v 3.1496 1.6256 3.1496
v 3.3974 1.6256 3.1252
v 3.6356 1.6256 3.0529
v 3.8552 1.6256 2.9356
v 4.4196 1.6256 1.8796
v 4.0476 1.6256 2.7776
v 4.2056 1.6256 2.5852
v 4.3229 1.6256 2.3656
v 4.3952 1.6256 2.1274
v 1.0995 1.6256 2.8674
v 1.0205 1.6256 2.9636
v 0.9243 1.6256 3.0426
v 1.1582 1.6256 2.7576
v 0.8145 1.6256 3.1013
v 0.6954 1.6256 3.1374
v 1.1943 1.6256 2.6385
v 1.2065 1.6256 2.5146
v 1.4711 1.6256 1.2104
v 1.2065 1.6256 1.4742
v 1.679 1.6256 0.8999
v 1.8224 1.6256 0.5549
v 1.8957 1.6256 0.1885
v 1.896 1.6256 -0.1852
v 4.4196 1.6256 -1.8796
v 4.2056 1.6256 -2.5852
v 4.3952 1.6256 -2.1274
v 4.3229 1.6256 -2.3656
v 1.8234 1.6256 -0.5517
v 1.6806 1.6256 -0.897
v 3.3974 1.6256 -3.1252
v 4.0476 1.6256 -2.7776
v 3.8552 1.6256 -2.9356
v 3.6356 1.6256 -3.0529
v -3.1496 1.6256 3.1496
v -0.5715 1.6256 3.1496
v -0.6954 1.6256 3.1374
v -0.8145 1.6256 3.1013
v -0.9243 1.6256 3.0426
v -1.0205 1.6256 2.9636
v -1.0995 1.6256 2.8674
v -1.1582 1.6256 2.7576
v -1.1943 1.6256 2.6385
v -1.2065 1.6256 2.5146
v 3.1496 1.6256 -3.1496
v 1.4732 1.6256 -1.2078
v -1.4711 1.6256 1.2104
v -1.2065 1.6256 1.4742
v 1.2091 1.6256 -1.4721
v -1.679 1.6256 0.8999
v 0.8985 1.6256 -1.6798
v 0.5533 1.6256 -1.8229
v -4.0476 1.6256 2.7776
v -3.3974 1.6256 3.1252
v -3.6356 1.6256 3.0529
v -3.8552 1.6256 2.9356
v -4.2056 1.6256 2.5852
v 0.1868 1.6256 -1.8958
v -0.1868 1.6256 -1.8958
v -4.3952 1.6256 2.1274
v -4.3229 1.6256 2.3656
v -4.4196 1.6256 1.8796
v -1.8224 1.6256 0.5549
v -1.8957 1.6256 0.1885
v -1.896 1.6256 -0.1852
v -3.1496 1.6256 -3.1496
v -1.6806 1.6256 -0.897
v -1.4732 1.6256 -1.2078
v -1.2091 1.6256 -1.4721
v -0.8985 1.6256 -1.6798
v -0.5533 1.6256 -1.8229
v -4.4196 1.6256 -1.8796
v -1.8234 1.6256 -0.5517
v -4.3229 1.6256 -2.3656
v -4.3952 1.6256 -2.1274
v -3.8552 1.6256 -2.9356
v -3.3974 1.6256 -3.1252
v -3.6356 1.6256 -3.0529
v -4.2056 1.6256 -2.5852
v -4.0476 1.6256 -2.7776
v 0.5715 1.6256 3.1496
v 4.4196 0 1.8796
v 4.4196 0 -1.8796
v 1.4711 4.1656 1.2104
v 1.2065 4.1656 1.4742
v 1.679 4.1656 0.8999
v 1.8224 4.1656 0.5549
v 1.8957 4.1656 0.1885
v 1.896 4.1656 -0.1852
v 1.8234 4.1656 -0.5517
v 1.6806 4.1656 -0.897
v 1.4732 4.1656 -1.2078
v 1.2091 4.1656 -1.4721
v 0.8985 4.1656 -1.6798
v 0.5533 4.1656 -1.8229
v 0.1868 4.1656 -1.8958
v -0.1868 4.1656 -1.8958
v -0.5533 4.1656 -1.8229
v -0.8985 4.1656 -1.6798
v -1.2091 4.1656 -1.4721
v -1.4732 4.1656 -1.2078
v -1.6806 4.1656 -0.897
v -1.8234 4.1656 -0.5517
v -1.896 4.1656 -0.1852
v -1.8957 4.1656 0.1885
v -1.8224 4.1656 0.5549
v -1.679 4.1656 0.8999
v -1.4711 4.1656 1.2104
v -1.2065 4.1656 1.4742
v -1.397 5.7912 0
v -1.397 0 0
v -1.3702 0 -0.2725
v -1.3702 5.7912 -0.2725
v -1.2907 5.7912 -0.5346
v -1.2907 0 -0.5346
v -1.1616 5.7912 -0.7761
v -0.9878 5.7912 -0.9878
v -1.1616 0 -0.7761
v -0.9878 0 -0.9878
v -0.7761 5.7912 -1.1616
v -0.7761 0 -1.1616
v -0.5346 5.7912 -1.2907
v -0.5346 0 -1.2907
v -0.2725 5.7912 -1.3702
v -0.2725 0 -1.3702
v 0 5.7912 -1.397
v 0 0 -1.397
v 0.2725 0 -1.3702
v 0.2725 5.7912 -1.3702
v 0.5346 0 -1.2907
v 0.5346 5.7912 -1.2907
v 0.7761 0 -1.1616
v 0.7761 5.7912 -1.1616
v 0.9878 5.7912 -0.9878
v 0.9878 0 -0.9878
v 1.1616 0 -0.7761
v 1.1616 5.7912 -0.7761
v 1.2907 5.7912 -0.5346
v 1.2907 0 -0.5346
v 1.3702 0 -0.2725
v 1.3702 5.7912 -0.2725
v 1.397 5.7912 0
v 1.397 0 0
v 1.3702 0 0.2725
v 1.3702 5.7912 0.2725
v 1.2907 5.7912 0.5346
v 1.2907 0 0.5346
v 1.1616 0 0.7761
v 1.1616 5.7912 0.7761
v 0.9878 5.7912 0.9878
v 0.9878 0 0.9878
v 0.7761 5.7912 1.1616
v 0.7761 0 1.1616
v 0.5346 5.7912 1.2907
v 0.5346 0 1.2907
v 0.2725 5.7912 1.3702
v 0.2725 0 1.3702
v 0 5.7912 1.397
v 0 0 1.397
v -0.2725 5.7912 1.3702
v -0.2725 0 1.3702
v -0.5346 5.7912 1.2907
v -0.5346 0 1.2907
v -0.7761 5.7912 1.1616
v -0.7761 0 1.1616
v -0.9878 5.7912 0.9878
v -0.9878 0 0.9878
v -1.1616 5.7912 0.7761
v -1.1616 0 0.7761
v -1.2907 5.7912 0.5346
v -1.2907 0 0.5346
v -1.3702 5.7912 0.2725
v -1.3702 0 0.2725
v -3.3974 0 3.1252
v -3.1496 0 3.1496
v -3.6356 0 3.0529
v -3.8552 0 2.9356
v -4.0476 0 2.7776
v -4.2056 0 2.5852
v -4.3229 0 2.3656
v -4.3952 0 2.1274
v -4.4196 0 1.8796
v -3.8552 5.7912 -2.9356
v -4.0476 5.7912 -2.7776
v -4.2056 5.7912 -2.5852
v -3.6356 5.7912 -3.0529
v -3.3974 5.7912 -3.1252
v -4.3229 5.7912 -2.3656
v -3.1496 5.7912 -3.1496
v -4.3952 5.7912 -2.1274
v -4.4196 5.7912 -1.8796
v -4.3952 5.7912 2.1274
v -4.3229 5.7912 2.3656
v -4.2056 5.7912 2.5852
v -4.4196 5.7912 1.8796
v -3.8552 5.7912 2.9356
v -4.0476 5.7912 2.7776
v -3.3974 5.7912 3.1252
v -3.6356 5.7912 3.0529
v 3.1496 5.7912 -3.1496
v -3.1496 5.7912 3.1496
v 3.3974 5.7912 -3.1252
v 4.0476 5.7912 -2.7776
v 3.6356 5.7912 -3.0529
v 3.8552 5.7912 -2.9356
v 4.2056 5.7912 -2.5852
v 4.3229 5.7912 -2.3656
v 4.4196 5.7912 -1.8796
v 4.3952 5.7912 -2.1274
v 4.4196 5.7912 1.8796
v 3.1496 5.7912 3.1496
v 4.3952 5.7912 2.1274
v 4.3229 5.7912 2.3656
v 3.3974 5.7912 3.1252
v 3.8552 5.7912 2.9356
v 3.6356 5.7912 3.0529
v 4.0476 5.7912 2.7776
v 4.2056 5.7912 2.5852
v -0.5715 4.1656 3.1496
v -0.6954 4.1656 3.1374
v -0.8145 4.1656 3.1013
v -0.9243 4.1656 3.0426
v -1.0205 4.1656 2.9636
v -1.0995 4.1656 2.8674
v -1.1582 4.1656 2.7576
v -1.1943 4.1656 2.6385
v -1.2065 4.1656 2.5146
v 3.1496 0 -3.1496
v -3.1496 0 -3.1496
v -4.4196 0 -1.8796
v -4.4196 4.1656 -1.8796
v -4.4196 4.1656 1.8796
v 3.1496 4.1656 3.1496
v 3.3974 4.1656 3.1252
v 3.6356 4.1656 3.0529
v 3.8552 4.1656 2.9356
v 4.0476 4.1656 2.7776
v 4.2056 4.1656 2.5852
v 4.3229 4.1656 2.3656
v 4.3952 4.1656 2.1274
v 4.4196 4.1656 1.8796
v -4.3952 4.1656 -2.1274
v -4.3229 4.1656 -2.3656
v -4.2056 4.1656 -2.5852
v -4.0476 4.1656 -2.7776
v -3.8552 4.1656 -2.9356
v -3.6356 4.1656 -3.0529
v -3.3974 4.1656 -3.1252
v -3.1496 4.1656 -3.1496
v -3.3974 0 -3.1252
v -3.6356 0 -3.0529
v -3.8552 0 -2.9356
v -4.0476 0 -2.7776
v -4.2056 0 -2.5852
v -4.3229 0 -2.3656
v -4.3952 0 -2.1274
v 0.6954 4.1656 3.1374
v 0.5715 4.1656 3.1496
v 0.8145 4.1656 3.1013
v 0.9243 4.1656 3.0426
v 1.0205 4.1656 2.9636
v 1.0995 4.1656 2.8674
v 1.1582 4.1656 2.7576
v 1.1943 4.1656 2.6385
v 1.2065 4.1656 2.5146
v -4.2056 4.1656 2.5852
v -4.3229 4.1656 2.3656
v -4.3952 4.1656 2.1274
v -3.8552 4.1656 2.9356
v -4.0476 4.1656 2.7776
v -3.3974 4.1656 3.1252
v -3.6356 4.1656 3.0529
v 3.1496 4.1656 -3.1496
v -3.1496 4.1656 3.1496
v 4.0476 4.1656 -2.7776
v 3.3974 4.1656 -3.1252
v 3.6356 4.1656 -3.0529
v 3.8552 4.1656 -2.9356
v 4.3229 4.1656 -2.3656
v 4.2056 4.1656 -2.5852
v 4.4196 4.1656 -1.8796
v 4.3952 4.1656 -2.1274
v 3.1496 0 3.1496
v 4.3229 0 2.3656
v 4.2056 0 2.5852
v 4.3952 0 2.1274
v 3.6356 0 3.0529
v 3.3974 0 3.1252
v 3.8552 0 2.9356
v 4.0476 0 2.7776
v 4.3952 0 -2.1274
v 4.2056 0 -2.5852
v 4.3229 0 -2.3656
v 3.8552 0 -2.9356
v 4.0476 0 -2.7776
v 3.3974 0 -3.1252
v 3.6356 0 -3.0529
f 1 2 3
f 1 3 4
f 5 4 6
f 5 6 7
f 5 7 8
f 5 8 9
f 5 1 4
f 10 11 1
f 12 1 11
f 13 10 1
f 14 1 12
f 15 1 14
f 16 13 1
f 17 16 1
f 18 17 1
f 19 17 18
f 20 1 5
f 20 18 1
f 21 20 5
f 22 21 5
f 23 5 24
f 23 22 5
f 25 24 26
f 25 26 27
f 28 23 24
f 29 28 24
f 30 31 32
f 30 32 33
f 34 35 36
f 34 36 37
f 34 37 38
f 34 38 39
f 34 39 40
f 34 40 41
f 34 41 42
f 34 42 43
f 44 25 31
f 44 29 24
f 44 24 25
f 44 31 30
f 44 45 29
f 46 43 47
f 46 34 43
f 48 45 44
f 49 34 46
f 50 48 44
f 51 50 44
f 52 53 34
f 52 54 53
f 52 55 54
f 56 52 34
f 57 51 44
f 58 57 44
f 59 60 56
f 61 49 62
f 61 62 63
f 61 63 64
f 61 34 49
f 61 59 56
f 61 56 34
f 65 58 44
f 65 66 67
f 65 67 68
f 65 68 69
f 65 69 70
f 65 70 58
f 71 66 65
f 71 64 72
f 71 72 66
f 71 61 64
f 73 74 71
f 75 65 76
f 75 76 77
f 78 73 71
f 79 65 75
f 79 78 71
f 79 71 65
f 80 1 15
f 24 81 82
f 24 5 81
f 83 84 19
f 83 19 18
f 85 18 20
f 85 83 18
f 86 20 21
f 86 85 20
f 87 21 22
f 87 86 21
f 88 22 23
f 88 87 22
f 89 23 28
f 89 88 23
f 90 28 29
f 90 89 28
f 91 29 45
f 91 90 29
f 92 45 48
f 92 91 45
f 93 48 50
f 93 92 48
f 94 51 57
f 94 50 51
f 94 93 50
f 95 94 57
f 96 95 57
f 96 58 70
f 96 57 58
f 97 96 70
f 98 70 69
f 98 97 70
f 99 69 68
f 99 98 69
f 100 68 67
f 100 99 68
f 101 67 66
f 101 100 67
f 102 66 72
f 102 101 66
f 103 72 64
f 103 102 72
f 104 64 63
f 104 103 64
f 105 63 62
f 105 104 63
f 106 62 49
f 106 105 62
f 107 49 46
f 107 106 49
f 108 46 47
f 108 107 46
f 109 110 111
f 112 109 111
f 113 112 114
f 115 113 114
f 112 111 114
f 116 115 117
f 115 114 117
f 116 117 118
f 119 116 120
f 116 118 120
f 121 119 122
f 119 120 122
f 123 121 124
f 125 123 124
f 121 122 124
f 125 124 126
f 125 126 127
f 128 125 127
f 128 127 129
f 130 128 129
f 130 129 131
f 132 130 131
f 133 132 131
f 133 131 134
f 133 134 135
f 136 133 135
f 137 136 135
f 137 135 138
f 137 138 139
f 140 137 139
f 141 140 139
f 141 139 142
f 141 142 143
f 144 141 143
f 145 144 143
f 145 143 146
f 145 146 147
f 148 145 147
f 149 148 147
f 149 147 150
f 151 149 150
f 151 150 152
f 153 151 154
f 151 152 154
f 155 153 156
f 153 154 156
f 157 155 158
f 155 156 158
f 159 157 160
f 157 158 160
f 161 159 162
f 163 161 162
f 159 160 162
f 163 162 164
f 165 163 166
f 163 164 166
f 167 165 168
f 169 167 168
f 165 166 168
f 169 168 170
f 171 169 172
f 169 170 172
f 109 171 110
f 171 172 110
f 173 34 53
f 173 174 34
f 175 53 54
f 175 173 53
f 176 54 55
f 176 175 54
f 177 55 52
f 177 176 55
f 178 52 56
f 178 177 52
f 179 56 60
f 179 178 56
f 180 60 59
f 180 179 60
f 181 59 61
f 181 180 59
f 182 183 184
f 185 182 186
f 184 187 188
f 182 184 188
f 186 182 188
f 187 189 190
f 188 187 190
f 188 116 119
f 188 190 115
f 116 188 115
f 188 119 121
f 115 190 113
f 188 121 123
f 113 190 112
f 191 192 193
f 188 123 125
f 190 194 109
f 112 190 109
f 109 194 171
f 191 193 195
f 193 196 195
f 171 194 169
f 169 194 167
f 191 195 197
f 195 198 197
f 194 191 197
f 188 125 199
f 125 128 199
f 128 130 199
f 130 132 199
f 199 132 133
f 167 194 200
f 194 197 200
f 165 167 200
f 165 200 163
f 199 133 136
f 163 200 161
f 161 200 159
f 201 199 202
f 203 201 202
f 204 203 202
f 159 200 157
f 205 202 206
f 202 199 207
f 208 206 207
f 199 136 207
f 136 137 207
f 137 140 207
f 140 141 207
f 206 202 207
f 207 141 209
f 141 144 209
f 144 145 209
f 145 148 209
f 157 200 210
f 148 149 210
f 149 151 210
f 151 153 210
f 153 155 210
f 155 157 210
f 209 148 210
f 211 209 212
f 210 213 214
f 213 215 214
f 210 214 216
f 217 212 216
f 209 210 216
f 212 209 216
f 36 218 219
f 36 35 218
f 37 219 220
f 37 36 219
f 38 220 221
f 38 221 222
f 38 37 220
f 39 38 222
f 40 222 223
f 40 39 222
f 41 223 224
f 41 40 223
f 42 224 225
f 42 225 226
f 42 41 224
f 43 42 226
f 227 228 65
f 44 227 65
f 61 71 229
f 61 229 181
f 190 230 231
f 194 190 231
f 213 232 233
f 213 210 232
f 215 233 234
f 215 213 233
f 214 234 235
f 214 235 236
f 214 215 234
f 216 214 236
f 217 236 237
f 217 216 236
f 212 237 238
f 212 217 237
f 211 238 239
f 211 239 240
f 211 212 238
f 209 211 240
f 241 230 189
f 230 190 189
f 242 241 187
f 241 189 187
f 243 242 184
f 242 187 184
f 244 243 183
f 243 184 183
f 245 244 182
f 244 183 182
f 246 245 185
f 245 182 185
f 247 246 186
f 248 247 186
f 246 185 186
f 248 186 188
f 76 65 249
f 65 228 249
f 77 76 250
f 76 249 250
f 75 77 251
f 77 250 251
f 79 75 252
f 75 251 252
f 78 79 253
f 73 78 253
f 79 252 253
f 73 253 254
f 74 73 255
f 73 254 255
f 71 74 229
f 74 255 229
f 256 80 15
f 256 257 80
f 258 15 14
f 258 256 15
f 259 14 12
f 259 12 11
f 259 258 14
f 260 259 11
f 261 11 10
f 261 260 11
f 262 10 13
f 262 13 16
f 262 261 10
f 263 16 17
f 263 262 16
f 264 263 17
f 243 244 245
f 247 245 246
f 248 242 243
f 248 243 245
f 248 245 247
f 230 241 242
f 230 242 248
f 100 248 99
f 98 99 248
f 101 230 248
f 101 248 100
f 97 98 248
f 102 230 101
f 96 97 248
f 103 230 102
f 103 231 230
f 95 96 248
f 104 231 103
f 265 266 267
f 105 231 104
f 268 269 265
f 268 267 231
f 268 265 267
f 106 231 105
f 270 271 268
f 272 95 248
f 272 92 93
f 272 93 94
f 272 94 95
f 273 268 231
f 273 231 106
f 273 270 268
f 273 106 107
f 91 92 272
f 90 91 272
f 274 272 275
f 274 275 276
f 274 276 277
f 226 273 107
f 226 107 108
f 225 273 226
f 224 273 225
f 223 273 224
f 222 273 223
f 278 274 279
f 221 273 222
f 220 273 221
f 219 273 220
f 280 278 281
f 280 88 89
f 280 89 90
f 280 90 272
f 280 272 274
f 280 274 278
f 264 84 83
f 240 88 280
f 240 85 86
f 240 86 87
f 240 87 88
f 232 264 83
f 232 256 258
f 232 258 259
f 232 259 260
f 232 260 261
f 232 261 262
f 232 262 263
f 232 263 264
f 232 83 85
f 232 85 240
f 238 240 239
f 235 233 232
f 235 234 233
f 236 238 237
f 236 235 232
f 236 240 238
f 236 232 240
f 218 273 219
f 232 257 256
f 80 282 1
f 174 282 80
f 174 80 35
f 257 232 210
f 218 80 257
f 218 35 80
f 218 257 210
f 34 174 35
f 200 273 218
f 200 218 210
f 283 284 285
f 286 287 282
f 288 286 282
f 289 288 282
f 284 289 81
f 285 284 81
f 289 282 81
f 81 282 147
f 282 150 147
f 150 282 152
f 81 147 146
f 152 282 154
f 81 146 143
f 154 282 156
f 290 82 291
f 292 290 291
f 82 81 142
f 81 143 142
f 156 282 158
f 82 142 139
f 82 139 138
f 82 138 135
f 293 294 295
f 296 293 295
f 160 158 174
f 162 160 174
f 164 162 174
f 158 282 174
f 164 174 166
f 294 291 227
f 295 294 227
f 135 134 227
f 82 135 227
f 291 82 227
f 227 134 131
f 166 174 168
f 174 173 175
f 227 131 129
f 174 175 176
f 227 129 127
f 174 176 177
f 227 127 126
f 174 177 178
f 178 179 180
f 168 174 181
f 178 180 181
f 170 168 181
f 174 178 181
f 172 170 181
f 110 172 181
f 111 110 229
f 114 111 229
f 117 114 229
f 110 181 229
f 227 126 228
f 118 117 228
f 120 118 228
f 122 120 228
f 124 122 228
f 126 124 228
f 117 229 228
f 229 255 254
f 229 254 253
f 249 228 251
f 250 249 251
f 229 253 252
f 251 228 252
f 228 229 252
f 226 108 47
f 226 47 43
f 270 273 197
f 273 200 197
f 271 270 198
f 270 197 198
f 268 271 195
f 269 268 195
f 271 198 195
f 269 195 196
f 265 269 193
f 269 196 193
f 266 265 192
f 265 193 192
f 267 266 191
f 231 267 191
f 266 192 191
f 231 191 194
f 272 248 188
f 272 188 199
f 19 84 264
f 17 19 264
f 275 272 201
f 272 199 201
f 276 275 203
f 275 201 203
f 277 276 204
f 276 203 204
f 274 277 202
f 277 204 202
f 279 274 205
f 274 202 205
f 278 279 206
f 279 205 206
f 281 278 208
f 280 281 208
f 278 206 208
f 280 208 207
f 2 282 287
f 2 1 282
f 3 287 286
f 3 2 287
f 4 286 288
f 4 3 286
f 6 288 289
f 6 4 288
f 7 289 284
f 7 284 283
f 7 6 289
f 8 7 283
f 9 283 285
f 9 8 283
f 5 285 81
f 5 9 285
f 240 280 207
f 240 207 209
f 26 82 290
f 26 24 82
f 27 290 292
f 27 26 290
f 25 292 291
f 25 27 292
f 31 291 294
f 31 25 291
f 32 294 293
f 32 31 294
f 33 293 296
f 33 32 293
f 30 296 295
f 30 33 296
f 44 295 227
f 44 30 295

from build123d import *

# Parameters (mm, degrees)
SKETCH_1_W           = 8.8392
SKETCH_1_H           = 6.2992
EXTRUDE_1_DEPTH      = 1.6256
EXTRUDE_2_DEPTH      = 2.54
SKETCH_3_W           = 5.6261
SKETCH_3_H           = 6.2992
EXTRUDE_3_DEPTH      = 1.6256
SKETCH_4_W           = 6.2992
SKETCH_4_H           = 1.6256
EXTRUDE_4_DEPTH      = 3.2131
HOLE_WIZARD_M2_5_1_D = 2.794
FILLET_1_R           = 0.635
FILLET_2_R           = 1.27


with BuildPart() as part:
    # 草圖1 → 填料-伸長1 (new body)
    with BuildSketch(Plane.XZ.offset(-4.1656)):
        Rectangle(SKETCH_1_W, SKETCH_1_H)
    extrude(amount=-EXTRUDE_1_DEPTH)

    # 草圖2 → 填料-伸長2 (add)
    with BuildSketch(Plane.XZ.offset(-4.1656)):
        with BuildLine():
            Line((-1.2065, 1.474239719), (-1.2065, 3.1496))
            Line((-1.2065, 3.1496), (1.2065, 3.1496))
            Line((1.2065, 3.1496), (1.2065, 1.474239719))
            ThreePointArc((1.2065, 1.474239719), (0, -1.905), (-1.2065, 1.474239719))
        make_face()
    extrude(amount=EXTRUDE_2_DEPTH)

    # 草圖3 → 填料-伸長3 (add)
    with BuildSketch(Plane.XZ.offset(-1.6256)):
        with Locations((-1.60655, 0)):
            Rectangle(SKETCH_3_W, SKETCH_3_H)
    extrude(amount=EXTRUDE_3_DEPTH)

    # 草圖4 → 填料-伸長4 (add)
    with BuildSketch(Plane(origin=(1.2065, 0, 0), x_dir=(0, 0, -1), z_dir=(1, 0, 0))):
        with Locations((0, 0.8128)):
            Rectangle(SKETCH_4_W, SKETCH_4_H)
    extrude(amount=EXTRUDE_4_DEPTH)

    # M2.5 餘隙孔1 (through all)
    with Locations(Plane(origin=(0, 5.7912, 0), x_dir=(1, 0, 0), z_dir=(0, 1, 0))):
        with Locations((0, 0)):
            Hole(HOLE_WIZARD_M2_5_1_D / 2)

    # 圓角1
    fillet_1_edges = [part.edges().sort_by_distance(p)[0] for p in [
        (-1.2065, 2.8956, 3.1496),
        (1.2065, 2.8956, 3.1496),
    ]]
    fillet(fillet_1_edges, radius=FILLET_1_R)

    # 圓角2
    fillet_2_edges = [part.edges().sort_by_distance(p)[0] for p in [
        (-4.4196, 0.8128, 3.1496),
        (-4.4196, 0.8128, -3.1496),
        (4.4196, 0.8128, 3.1496),
        (4.4196, 0.8128, -3.1496),
        (4.4196, 4.9784, -3.1496),
        (-4.4196, 4.9784, -3.1496),
        (-4.4196, 4.9784, 3.1496),
        (4.4196, 4.9784, 3.1496),
    ]]
    fillet(fillet_2_edges, radius=FILLET_2_R)


solid = part.part
